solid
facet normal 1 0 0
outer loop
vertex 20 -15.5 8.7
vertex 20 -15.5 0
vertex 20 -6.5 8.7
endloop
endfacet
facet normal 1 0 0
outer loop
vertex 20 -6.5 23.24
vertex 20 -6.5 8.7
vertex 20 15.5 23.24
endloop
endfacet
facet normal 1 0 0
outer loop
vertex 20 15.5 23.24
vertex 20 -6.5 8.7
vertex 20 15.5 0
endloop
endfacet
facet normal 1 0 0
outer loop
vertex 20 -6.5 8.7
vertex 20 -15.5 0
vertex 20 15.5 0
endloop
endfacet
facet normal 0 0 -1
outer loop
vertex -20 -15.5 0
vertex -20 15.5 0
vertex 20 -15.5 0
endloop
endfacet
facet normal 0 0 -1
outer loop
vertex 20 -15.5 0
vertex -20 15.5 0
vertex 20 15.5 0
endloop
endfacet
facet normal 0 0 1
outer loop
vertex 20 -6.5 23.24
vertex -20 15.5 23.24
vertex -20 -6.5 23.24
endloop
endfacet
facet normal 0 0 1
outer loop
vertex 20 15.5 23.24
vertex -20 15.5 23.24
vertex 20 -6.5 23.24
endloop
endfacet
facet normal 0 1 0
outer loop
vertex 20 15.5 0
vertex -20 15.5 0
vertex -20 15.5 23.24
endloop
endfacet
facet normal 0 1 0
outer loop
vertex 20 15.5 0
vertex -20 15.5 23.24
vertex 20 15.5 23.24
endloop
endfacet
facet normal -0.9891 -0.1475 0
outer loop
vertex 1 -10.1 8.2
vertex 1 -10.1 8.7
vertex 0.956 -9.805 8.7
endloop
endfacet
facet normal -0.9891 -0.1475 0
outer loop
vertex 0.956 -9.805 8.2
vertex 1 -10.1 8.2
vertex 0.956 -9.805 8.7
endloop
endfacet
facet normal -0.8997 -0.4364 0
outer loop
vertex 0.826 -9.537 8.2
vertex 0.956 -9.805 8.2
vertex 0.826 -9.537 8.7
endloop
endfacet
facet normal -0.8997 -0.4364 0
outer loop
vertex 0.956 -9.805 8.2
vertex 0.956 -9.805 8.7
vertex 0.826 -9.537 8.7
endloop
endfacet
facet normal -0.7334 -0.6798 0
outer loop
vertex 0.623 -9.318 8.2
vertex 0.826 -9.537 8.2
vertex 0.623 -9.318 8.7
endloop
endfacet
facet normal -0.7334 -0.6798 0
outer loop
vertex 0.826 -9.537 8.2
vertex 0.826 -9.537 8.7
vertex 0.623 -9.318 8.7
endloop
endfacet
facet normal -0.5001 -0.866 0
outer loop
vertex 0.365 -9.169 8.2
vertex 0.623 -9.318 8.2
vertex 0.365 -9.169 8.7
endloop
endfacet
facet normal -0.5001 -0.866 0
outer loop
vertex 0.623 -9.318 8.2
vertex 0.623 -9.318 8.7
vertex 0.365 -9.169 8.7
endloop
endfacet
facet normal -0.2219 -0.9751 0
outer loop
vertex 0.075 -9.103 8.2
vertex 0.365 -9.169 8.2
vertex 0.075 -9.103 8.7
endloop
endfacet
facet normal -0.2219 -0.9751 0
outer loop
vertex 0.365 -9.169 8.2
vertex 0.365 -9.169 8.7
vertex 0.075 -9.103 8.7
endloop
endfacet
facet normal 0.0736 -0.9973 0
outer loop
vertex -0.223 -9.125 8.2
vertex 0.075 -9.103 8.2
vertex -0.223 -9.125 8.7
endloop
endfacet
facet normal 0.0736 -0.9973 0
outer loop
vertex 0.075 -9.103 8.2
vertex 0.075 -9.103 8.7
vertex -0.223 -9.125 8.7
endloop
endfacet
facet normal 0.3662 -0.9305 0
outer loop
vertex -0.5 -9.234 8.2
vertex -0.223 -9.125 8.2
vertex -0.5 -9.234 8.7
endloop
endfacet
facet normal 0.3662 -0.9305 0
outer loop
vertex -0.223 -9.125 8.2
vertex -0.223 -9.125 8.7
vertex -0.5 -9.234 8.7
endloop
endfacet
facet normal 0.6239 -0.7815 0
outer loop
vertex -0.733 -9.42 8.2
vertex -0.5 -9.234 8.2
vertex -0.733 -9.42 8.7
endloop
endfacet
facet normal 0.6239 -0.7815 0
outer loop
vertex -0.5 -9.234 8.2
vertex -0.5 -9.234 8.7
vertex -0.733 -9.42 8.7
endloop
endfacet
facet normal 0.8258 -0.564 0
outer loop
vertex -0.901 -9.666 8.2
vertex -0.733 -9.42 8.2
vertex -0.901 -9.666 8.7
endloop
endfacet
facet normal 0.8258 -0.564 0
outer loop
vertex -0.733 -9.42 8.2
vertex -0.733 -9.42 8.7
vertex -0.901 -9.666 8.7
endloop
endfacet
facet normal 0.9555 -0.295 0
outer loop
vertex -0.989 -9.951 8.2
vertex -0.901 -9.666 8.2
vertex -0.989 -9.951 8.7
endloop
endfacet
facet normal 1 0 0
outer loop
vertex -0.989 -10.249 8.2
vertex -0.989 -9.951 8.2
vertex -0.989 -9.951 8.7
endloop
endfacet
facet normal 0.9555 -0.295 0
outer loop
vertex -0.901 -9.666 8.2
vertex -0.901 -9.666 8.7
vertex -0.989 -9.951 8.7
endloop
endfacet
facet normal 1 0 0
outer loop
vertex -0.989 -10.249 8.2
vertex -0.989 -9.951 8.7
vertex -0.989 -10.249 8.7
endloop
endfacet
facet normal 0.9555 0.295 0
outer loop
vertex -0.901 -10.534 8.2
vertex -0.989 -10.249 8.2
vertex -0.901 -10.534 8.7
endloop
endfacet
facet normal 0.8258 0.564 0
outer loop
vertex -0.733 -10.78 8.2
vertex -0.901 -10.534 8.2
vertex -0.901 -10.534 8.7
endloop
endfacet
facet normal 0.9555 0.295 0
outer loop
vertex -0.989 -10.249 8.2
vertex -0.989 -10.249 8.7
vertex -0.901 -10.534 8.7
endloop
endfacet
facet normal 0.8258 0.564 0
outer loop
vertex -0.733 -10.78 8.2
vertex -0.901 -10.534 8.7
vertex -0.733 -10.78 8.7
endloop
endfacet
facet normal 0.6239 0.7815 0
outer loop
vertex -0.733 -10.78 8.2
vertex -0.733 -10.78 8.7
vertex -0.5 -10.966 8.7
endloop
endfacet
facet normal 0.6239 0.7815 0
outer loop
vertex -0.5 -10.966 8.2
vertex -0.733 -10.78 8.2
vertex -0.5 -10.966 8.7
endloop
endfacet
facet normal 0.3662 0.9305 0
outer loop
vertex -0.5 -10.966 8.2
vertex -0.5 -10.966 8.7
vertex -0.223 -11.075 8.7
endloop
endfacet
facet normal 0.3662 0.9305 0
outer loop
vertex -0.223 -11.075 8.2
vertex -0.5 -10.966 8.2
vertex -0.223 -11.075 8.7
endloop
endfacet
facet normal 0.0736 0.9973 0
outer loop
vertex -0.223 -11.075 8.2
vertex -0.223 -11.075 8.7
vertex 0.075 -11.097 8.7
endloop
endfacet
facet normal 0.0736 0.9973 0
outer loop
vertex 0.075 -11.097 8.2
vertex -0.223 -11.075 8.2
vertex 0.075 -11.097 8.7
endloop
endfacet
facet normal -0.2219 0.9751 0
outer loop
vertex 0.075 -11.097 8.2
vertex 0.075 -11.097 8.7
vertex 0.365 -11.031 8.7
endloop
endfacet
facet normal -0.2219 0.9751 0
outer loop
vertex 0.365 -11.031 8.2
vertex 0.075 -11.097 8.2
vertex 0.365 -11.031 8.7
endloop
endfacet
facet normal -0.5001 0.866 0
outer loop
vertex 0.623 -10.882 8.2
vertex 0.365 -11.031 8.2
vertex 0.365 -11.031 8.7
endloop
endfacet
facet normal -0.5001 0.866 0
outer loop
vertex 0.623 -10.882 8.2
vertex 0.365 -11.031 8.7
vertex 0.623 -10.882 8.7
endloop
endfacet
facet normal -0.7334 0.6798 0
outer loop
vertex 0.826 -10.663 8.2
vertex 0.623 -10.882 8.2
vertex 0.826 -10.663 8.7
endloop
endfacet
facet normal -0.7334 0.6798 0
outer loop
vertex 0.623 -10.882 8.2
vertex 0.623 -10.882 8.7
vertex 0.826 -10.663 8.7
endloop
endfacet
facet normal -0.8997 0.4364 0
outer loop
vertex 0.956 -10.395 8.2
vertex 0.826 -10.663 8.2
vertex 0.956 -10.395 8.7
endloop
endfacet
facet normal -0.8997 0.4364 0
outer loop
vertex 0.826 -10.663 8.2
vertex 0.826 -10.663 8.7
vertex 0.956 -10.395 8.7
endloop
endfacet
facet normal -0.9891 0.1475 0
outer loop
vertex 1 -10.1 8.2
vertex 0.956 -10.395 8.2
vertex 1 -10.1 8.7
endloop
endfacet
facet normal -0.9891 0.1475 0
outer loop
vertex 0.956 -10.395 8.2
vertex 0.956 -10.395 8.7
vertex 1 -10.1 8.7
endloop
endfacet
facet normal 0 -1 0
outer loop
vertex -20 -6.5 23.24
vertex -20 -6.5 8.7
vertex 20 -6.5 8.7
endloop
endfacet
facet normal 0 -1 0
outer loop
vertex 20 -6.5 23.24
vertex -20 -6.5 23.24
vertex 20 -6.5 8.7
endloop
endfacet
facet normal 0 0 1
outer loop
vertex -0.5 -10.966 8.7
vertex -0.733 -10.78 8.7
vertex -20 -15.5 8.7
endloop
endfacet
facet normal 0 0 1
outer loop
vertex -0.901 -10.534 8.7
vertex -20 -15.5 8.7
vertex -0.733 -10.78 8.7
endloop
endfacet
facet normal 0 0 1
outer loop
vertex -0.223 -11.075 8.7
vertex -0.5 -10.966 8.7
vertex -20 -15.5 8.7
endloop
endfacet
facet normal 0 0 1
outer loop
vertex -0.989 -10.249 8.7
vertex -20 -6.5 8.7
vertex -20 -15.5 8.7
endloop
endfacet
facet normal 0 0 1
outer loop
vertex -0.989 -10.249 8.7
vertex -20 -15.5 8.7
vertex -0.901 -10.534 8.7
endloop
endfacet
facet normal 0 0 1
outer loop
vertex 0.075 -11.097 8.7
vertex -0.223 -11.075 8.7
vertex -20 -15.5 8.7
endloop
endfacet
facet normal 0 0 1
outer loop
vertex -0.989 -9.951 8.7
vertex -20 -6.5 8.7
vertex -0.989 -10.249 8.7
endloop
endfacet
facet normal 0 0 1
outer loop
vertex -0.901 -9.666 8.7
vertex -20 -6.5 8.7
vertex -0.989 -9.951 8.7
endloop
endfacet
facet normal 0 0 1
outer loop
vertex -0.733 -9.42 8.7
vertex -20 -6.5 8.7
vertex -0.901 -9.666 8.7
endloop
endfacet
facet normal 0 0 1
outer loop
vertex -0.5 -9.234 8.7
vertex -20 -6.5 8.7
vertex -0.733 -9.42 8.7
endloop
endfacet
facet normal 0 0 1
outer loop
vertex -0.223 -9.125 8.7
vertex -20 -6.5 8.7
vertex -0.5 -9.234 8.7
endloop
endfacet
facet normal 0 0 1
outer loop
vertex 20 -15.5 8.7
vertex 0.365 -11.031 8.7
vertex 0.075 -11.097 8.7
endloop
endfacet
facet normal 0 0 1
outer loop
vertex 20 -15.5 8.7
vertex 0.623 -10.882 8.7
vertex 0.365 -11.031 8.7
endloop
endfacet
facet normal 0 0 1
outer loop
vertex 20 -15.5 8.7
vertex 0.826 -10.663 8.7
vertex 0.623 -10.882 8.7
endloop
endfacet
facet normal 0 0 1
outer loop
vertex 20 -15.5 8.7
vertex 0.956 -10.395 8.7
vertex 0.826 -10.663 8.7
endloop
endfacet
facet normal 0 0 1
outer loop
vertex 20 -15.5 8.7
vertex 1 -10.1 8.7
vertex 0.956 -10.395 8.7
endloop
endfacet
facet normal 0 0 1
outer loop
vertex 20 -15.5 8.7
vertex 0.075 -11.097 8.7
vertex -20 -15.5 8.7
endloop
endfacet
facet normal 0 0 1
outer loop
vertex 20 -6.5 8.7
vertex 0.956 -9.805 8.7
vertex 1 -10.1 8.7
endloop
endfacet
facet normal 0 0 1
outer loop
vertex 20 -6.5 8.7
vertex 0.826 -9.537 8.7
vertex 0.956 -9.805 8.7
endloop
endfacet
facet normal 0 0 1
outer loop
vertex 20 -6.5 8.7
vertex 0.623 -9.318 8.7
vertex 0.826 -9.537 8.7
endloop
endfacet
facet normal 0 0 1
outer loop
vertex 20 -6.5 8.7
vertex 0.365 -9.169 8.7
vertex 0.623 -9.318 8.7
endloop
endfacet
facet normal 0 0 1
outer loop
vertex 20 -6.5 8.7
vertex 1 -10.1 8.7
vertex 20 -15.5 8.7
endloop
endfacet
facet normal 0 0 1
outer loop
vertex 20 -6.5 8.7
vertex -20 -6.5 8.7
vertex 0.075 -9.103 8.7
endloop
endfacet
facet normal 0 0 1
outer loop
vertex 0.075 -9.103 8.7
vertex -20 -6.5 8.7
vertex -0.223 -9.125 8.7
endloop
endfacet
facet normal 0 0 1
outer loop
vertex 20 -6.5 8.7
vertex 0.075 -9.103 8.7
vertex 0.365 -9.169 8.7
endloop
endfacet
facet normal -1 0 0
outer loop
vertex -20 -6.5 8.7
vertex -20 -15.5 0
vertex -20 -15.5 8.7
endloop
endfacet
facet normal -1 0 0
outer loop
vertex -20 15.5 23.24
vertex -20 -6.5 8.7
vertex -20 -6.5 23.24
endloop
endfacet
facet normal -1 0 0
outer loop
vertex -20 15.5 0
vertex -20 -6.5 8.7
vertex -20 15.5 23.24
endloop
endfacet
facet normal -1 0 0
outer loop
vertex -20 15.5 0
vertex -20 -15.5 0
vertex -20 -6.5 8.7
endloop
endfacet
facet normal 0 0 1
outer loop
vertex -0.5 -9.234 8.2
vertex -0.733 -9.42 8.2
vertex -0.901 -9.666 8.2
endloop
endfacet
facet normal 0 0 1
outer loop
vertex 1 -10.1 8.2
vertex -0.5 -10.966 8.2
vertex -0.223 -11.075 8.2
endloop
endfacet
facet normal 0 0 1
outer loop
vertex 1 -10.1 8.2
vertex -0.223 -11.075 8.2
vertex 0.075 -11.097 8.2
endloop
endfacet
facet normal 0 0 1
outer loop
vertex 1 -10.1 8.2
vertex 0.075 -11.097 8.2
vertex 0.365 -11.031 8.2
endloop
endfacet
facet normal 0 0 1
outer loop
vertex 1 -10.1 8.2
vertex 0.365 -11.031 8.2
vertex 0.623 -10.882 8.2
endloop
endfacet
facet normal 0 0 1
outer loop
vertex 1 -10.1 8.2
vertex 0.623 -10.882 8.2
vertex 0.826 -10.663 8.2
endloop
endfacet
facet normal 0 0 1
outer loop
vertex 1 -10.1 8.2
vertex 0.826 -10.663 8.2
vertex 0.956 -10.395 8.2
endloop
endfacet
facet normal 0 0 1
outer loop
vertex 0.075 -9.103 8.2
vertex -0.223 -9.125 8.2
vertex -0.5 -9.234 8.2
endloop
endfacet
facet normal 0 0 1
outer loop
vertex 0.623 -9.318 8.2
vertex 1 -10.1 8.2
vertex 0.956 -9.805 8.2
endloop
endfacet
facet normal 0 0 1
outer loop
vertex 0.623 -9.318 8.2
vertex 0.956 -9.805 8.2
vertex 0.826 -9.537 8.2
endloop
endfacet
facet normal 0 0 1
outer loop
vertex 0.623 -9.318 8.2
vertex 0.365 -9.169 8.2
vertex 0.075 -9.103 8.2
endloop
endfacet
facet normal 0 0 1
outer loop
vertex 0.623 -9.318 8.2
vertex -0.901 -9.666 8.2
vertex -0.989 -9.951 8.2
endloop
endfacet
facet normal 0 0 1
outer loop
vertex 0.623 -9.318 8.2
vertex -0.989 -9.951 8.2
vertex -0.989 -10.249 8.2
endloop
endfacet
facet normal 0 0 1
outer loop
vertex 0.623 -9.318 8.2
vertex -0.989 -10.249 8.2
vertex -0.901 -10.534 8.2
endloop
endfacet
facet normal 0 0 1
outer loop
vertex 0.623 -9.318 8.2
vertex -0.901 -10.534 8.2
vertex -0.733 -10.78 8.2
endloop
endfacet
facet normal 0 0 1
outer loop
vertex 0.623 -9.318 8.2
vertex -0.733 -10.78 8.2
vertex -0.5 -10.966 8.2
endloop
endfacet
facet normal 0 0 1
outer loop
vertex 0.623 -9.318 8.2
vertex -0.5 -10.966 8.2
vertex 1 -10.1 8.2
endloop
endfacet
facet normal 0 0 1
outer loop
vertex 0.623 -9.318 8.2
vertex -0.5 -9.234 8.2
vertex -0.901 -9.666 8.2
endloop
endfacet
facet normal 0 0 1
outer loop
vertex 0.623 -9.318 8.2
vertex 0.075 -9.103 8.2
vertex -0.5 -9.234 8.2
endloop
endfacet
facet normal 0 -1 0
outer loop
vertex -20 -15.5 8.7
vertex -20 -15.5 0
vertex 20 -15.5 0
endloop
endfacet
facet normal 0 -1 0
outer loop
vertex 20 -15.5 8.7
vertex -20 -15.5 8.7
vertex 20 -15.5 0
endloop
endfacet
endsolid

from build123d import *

# Parameters (mm, degrees)
F0_W     = 40
F0_H     = 31
F1_DEPTH = 8.7
F2_W     = 40
F2_H     = 22
F3_DEPTH = 14.54
F4_R     = 1
F5_DEPTH = 0.5


with BuildPart() as f1:
    # F0 (on Top) → F1 (new body)
    with BuildSketch(Plane.XY):
        Rectangle(F0_W, F0_H)
    extrude(amount=F1_DEPTH)

    # F2 (on face) → F3 (join)
    with BuildSketch(Plane.XY.offset(8.7)):
        with Locations((0, 4.5)):
            Rectangle(F2_W, F2_H)
    extrude(amount=F3_DEPTH)

    # F4 (on face) → F5 (cut)
    with BuildSketch(Plane.XY.offset(8.7)):
        with Locations((0, -10.1)):
            Circle(F4_R)
    extrude(amount=-F5_DEPTH, mode=Mode.SUBTRACT)


solid = f1.part
